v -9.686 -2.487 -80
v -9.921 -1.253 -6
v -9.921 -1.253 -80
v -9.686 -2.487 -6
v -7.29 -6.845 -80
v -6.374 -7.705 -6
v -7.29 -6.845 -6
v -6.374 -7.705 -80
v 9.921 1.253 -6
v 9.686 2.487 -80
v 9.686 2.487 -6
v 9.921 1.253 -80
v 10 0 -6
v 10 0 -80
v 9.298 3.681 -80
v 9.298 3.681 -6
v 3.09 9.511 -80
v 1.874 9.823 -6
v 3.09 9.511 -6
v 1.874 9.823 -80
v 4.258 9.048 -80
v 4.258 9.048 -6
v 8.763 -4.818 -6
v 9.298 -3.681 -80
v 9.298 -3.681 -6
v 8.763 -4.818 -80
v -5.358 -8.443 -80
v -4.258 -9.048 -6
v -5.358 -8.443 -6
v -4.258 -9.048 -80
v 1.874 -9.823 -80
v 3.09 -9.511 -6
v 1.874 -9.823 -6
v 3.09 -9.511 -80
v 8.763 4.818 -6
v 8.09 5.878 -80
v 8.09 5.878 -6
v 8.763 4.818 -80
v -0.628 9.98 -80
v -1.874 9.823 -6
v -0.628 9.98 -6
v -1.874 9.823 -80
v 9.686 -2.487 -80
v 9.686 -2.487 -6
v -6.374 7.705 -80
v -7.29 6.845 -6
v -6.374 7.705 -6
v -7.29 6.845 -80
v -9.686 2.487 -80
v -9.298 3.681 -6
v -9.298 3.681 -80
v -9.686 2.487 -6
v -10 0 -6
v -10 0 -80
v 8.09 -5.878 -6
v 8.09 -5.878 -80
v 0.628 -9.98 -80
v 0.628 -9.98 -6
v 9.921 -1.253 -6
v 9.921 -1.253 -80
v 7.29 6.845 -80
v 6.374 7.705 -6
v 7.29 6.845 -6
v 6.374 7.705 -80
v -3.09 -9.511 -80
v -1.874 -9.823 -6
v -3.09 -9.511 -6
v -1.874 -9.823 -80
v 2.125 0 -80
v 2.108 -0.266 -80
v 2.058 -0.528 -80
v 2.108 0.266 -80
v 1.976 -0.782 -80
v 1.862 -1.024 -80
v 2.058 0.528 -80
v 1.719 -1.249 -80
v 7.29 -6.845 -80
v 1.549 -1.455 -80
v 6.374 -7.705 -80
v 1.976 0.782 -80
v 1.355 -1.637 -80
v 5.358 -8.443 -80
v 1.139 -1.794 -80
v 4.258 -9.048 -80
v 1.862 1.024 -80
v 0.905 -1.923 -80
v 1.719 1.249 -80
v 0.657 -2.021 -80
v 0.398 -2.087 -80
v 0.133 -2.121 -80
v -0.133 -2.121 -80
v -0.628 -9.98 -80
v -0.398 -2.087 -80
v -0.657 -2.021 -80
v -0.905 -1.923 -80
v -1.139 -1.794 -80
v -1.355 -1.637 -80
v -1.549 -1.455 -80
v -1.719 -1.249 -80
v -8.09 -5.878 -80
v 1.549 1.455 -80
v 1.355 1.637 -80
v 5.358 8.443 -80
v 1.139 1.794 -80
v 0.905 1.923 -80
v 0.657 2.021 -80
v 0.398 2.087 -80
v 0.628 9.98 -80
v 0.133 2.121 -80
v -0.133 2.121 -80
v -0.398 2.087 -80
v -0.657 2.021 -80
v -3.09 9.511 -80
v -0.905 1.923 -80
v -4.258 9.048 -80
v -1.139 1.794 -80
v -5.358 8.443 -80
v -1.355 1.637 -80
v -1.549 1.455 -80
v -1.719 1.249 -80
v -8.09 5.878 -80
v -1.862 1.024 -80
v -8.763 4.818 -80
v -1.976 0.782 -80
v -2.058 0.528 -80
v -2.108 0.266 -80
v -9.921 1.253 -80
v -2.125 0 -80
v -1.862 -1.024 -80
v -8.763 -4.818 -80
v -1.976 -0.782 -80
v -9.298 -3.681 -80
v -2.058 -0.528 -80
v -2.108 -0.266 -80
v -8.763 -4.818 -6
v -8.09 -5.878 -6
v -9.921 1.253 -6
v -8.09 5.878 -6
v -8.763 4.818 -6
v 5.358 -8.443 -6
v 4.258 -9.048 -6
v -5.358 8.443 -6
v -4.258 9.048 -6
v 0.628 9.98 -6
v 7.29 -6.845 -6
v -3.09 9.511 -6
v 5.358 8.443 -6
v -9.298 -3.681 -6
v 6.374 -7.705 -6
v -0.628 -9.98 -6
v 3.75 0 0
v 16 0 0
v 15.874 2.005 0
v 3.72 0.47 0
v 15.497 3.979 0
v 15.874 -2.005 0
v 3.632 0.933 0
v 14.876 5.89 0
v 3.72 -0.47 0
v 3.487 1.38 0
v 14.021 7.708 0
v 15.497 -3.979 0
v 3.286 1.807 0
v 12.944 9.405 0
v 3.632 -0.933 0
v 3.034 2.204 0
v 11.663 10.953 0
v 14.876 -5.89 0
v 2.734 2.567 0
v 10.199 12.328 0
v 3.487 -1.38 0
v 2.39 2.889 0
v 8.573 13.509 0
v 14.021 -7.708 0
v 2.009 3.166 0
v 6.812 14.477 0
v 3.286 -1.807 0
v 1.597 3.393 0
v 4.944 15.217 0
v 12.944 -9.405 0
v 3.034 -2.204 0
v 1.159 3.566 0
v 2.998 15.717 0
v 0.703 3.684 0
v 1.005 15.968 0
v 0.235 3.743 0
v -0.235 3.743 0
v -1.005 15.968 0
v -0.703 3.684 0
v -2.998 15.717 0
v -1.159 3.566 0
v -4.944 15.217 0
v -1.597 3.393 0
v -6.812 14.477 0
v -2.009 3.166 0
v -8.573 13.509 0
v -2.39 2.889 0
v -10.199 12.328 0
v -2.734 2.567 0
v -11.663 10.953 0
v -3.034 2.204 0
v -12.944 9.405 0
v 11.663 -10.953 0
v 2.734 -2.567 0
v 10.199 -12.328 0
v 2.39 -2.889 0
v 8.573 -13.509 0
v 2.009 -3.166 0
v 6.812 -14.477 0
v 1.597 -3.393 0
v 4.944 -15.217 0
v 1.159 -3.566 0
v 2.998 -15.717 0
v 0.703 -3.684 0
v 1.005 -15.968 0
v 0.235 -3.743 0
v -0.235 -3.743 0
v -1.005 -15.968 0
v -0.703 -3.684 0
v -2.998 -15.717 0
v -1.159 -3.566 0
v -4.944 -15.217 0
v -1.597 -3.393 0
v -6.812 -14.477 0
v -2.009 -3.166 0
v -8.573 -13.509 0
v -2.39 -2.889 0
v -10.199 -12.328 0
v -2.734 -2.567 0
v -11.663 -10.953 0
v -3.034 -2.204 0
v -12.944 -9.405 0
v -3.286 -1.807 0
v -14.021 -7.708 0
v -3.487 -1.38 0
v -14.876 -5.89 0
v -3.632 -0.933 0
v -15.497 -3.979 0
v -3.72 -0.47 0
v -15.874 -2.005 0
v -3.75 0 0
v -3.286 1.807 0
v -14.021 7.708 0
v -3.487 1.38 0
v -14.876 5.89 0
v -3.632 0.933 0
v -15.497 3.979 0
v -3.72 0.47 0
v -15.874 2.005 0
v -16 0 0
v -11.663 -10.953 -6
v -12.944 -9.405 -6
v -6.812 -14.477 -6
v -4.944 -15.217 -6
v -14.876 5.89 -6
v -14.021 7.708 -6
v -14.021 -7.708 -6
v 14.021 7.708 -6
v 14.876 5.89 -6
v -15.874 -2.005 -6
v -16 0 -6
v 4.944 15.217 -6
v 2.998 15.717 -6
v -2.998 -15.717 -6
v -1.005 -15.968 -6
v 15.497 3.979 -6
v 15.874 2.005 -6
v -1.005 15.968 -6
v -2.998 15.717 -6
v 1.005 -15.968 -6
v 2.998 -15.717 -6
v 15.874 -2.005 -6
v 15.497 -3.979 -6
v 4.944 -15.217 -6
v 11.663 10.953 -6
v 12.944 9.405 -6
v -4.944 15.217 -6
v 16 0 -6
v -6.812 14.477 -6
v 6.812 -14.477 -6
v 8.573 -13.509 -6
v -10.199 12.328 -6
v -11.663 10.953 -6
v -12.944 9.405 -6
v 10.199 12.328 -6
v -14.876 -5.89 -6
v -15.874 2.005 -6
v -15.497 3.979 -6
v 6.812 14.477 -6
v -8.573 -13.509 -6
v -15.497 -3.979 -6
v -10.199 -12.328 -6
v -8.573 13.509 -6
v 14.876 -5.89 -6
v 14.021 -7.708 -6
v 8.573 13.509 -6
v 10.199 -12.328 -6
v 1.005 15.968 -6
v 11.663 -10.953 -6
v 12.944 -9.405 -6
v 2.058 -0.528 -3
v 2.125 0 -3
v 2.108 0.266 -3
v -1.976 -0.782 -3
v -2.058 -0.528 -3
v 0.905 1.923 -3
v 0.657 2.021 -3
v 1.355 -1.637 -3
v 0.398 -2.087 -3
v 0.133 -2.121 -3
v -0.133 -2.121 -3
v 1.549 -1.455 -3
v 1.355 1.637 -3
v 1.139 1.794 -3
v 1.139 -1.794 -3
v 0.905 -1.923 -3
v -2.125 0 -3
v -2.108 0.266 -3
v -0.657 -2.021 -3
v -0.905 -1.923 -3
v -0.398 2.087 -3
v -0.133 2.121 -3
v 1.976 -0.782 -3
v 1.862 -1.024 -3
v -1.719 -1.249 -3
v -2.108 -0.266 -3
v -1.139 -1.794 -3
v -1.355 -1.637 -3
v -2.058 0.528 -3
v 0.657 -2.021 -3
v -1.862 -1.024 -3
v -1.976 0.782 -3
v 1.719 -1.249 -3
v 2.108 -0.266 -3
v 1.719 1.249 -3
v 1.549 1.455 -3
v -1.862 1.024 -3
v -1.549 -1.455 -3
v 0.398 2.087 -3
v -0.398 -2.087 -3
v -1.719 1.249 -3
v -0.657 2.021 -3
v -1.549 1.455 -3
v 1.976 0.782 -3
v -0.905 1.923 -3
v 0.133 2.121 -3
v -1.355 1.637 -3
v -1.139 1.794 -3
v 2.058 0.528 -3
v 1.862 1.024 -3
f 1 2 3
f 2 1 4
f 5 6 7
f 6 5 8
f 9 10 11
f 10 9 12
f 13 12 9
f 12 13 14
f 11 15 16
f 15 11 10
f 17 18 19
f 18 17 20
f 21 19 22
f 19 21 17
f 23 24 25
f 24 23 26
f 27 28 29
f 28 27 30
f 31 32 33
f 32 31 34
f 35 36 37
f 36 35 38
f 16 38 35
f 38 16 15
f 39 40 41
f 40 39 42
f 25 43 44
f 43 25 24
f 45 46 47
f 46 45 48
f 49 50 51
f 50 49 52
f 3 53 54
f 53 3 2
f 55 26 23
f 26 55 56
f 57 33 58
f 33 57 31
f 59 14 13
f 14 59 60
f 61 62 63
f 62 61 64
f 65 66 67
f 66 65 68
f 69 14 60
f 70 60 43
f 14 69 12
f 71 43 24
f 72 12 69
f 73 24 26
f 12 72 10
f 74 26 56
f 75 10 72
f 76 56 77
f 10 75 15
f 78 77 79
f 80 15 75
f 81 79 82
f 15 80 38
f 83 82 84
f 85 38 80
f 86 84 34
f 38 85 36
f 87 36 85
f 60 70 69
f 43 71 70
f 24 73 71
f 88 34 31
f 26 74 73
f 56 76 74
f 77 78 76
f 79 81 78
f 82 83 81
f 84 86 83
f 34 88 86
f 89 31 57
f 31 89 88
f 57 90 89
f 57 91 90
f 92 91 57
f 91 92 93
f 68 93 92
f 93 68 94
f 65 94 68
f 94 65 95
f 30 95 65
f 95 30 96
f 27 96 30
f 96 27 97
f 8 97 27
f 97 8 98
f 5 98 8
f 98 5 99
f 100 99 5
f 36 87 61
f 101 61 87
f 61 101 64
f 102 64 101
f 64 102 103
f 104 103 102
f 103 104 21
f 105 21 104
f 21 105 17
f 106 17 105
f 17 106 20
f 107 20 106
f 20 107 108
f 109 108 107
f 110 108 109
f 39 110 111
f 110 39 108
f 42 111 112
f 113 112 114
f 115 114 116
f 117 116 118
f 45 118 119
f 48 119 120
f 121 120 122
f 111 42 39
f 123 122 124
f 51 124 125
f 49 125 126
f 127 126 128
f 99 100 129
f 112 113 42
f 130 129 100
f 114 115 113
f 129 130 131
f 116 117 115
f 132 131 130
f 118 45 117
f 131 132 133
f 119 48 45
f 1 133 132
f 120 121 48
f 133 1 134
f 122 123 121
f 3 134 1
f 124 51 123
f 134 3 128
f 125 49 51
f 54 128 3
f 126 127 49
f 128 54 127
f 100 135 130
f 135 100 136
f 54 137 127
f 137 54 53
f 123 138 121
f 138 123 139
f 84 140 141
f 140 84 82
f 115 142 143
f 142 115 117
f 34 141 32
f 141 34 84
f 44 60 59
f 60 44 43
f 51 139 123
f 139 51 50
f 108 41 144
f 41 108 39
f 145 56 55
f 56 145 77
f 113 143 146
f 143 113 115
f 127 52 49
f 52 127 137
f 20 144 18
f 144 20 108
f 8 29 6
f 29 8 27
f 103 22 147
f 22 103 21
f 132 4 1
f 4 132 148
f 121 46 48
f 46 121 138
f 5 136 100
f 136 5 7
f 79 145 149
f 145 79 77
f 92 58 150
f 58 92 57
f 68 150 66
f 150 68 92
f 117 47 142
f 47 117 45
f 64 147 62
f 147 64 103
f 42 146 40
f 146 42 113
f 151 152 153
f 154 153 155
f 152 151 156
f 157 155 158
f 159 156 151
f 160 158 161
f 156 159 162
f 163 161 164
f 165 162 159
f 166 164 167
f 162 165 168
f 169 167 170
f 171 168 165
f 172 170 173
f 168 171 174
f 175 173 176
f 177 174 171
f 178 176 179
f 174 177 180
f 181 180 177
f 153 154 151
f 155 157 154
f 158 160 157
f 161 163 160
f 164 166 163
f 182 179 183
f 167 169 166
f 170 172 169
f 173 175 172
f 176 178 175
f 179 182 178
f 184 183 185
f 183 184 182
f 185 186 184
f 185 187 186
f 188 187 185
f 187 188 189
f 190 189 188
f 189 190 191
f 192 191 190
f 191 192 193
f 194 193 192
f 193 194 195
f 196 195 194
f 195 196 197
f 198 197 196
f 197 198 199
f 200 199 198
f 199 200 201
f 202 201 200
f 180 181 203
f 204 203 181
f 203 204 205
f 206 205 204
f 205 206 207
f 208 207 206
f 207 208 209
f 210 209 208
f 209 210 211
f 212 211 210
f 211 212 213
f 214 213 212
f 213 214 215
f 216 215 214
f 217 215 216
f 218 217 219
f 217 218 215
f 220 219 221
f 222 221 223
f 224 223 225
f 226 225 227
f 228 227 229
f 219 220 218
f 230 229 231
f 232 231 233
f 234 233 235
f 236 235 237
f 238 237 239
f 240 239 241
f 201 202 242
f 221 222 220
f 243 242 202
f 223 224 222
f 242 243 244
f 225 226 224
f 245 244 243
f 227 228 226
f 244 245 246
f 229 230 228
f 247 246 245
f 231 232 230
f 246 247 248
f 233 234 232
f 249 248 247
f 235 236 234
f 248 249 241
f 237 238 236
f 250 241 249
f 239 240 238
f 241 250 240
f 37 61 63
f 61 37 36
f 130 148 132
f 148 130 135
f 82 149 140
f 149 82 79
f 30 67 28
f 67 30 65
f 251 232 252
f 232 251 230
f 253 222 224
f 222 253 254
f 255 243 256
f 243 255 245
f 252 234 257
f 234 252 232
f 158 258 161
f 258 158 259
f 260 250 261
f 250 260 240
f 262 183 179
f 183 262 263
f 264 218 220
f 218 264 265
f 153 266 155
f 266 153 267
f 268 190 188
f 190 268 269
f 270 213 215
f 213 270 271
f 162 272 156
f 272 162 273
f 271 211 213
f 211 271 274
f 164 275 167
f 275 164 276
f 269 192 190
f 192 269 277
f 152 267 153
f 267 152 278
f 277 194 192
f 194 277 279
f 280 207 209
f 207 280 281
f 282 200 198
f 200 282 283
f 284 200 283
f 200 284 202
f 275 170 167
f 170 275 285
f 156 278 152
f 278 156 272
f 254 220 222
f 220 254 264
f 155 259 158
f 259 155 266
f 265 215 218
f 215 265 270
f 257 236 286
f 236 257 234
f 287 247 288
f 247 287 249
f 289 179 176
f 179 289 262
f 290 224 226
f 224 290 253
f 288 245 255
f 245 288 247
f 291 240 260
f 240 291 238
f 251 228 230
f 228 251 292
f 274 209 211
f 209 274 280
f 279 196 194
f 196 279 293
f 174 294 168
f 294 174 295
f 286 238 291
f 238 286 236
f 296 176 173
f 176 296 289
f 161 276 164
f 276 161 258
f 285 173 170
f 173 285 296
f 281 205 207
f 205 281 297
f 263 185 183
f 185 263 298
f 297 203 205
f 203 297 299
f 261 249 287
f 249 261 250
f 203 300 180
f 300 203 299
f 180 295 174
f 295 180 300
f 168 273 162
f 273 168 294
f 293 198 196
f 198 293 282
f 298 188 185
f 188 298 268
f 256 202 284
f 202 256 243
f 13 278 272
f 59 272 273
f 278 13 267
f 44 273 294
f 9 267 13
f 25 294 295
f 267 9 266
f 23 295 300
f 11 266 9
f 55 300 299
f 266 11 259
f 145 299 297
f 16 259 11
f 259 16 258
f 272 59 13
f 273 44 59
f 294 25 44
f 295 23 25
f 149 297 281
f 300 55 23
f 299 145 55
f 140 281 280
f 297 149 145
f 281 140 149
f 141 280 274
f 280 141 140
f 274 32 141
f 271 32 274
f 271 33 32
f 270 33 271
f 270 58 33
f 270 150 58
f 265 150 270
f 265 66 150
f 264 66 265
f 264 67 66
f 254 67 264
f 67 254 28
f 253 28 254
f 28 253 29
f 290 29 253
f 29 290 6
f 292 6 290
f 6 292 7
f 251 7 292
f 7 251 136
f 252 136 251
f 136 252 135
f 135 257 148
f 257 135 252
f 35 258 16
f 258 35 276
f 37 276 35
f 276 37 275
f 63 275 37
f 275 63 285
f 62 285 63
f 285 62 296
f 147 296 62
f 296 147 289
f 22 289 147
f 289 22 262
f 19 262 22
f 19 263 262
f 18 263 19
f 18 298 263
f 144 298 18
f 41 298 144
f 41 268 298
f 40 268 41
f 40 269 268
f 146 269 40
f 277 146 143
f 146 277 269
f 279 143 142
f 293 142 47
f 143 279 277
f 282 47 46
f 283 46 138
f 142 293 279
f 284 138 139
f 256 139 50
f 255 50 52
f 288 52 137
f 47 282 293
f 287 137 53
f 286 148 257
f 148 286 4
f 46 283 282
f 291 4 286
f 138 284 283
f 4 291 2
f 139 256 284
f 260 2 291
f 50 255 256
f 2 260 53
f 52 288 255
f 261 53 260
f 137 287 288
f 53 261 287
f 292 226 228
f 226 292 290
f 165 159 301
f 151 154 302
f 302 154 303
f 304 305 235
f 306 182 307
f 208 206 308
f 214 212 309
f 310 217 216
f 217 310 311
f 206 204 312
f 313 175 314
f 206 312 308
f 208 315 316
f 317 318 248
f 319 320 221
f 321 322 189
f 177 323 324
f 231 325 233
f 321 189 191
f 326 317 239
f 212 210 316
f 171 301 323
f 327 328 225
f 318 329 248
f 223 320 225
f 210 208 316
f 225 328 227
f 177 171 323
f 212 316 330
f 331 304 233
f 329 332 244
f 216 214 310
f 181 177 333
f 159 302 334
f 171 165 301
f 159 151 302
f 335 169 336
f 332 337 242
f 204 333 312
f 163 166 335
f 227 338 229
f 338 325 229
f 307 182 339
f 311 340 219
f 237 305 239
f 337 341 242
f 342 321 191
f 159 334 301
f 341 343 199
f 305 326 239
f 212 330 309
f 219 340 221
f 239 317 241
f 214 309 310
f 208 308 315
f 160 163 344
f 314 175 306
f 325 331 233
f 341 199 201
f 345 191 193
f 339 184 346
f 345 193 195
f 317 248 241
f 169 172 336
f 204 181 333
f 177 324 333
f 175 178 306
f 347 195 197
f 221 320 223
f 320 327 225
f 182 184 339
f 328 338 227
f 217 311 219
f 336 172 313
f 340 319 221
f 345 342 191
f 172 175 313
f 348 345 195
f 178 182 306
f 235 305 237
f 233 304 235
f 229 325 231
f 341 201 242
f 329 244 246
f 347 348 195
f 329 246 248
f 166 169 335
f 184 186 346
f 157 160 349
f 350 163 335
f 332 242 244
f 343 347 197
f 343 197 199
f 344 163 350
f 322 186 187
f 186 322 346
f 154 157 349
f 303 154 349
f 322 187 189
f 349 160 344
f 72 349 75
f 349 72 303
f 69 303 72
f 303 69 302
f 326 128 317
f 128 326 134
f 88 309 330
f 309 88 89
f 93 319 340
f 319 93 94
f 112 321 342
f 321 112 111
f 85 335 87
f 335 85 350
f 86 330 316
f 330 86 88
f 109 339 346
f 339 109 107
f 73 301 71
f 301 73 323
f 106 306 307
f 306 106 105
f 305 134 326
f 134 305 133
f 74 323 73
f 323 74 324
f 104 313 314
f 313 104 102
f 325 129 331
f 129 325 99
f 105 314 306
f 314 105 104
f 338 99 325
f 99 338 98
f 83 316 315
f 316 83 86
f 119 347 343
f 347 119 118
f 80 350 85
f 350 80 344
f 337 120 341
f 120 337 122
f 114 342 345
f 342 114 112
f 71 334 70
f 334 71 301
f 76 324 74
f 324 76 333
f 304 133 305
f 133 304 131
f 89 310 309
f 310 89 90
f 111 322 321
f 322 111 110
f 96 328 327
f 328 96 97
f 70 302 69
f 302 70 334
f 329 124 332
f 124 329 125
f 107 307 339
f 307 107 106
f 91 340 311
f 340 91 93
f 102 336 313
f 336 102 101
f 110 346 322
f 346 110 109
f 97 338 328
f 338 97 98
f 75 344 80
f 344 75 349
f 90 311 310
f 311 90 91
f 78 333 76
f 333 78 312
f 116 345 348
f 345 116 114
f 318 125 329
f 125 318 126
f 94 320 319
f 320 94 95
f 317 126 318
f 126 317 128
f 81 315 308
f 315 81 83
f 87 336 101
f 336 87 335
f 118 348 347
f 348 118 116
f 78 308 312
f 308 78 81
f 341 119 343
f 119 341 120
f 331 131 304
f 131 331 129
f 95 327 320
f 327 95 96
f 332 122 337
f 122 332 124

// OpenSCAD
$fn = 50;


difference() {
	union() {
		translate(v = [0, 0, -80.0000000000]) {
			cylinder(h = 80, r = 10.0000000000);
		}
		translate(v = [0, 0, -6.0000000000]) {
			cylinder(h = 6, r = 16.0000000000);
		}
	}
	union() {
		translate(v = [0, 0, 0]) {
			rotate(a = [0, 0, 0]) {
				difference() {
					union() {
						#translate(v = [0, 0, -80.0000000000]) {
							cylinder(h = 80, r = 2.0000000000);
						}
						#translate(v = [0, 0, -3]) {
							cylinder(h = 3, r = 10.0000000000, r1 = 2.1250000000, r2 = 3.7500000000);
						}
						#translate(v = [0, 0, -80.0000000000]) {
							cylinder(h = 80, r = 2.1250000000);
						}
						#translate(v = [0, 0, -80.0000000000]) {
							cylinder(h = 80, r = 2.0000000000);
						}
					}
					union();
				}
			}
		}
	}
}
